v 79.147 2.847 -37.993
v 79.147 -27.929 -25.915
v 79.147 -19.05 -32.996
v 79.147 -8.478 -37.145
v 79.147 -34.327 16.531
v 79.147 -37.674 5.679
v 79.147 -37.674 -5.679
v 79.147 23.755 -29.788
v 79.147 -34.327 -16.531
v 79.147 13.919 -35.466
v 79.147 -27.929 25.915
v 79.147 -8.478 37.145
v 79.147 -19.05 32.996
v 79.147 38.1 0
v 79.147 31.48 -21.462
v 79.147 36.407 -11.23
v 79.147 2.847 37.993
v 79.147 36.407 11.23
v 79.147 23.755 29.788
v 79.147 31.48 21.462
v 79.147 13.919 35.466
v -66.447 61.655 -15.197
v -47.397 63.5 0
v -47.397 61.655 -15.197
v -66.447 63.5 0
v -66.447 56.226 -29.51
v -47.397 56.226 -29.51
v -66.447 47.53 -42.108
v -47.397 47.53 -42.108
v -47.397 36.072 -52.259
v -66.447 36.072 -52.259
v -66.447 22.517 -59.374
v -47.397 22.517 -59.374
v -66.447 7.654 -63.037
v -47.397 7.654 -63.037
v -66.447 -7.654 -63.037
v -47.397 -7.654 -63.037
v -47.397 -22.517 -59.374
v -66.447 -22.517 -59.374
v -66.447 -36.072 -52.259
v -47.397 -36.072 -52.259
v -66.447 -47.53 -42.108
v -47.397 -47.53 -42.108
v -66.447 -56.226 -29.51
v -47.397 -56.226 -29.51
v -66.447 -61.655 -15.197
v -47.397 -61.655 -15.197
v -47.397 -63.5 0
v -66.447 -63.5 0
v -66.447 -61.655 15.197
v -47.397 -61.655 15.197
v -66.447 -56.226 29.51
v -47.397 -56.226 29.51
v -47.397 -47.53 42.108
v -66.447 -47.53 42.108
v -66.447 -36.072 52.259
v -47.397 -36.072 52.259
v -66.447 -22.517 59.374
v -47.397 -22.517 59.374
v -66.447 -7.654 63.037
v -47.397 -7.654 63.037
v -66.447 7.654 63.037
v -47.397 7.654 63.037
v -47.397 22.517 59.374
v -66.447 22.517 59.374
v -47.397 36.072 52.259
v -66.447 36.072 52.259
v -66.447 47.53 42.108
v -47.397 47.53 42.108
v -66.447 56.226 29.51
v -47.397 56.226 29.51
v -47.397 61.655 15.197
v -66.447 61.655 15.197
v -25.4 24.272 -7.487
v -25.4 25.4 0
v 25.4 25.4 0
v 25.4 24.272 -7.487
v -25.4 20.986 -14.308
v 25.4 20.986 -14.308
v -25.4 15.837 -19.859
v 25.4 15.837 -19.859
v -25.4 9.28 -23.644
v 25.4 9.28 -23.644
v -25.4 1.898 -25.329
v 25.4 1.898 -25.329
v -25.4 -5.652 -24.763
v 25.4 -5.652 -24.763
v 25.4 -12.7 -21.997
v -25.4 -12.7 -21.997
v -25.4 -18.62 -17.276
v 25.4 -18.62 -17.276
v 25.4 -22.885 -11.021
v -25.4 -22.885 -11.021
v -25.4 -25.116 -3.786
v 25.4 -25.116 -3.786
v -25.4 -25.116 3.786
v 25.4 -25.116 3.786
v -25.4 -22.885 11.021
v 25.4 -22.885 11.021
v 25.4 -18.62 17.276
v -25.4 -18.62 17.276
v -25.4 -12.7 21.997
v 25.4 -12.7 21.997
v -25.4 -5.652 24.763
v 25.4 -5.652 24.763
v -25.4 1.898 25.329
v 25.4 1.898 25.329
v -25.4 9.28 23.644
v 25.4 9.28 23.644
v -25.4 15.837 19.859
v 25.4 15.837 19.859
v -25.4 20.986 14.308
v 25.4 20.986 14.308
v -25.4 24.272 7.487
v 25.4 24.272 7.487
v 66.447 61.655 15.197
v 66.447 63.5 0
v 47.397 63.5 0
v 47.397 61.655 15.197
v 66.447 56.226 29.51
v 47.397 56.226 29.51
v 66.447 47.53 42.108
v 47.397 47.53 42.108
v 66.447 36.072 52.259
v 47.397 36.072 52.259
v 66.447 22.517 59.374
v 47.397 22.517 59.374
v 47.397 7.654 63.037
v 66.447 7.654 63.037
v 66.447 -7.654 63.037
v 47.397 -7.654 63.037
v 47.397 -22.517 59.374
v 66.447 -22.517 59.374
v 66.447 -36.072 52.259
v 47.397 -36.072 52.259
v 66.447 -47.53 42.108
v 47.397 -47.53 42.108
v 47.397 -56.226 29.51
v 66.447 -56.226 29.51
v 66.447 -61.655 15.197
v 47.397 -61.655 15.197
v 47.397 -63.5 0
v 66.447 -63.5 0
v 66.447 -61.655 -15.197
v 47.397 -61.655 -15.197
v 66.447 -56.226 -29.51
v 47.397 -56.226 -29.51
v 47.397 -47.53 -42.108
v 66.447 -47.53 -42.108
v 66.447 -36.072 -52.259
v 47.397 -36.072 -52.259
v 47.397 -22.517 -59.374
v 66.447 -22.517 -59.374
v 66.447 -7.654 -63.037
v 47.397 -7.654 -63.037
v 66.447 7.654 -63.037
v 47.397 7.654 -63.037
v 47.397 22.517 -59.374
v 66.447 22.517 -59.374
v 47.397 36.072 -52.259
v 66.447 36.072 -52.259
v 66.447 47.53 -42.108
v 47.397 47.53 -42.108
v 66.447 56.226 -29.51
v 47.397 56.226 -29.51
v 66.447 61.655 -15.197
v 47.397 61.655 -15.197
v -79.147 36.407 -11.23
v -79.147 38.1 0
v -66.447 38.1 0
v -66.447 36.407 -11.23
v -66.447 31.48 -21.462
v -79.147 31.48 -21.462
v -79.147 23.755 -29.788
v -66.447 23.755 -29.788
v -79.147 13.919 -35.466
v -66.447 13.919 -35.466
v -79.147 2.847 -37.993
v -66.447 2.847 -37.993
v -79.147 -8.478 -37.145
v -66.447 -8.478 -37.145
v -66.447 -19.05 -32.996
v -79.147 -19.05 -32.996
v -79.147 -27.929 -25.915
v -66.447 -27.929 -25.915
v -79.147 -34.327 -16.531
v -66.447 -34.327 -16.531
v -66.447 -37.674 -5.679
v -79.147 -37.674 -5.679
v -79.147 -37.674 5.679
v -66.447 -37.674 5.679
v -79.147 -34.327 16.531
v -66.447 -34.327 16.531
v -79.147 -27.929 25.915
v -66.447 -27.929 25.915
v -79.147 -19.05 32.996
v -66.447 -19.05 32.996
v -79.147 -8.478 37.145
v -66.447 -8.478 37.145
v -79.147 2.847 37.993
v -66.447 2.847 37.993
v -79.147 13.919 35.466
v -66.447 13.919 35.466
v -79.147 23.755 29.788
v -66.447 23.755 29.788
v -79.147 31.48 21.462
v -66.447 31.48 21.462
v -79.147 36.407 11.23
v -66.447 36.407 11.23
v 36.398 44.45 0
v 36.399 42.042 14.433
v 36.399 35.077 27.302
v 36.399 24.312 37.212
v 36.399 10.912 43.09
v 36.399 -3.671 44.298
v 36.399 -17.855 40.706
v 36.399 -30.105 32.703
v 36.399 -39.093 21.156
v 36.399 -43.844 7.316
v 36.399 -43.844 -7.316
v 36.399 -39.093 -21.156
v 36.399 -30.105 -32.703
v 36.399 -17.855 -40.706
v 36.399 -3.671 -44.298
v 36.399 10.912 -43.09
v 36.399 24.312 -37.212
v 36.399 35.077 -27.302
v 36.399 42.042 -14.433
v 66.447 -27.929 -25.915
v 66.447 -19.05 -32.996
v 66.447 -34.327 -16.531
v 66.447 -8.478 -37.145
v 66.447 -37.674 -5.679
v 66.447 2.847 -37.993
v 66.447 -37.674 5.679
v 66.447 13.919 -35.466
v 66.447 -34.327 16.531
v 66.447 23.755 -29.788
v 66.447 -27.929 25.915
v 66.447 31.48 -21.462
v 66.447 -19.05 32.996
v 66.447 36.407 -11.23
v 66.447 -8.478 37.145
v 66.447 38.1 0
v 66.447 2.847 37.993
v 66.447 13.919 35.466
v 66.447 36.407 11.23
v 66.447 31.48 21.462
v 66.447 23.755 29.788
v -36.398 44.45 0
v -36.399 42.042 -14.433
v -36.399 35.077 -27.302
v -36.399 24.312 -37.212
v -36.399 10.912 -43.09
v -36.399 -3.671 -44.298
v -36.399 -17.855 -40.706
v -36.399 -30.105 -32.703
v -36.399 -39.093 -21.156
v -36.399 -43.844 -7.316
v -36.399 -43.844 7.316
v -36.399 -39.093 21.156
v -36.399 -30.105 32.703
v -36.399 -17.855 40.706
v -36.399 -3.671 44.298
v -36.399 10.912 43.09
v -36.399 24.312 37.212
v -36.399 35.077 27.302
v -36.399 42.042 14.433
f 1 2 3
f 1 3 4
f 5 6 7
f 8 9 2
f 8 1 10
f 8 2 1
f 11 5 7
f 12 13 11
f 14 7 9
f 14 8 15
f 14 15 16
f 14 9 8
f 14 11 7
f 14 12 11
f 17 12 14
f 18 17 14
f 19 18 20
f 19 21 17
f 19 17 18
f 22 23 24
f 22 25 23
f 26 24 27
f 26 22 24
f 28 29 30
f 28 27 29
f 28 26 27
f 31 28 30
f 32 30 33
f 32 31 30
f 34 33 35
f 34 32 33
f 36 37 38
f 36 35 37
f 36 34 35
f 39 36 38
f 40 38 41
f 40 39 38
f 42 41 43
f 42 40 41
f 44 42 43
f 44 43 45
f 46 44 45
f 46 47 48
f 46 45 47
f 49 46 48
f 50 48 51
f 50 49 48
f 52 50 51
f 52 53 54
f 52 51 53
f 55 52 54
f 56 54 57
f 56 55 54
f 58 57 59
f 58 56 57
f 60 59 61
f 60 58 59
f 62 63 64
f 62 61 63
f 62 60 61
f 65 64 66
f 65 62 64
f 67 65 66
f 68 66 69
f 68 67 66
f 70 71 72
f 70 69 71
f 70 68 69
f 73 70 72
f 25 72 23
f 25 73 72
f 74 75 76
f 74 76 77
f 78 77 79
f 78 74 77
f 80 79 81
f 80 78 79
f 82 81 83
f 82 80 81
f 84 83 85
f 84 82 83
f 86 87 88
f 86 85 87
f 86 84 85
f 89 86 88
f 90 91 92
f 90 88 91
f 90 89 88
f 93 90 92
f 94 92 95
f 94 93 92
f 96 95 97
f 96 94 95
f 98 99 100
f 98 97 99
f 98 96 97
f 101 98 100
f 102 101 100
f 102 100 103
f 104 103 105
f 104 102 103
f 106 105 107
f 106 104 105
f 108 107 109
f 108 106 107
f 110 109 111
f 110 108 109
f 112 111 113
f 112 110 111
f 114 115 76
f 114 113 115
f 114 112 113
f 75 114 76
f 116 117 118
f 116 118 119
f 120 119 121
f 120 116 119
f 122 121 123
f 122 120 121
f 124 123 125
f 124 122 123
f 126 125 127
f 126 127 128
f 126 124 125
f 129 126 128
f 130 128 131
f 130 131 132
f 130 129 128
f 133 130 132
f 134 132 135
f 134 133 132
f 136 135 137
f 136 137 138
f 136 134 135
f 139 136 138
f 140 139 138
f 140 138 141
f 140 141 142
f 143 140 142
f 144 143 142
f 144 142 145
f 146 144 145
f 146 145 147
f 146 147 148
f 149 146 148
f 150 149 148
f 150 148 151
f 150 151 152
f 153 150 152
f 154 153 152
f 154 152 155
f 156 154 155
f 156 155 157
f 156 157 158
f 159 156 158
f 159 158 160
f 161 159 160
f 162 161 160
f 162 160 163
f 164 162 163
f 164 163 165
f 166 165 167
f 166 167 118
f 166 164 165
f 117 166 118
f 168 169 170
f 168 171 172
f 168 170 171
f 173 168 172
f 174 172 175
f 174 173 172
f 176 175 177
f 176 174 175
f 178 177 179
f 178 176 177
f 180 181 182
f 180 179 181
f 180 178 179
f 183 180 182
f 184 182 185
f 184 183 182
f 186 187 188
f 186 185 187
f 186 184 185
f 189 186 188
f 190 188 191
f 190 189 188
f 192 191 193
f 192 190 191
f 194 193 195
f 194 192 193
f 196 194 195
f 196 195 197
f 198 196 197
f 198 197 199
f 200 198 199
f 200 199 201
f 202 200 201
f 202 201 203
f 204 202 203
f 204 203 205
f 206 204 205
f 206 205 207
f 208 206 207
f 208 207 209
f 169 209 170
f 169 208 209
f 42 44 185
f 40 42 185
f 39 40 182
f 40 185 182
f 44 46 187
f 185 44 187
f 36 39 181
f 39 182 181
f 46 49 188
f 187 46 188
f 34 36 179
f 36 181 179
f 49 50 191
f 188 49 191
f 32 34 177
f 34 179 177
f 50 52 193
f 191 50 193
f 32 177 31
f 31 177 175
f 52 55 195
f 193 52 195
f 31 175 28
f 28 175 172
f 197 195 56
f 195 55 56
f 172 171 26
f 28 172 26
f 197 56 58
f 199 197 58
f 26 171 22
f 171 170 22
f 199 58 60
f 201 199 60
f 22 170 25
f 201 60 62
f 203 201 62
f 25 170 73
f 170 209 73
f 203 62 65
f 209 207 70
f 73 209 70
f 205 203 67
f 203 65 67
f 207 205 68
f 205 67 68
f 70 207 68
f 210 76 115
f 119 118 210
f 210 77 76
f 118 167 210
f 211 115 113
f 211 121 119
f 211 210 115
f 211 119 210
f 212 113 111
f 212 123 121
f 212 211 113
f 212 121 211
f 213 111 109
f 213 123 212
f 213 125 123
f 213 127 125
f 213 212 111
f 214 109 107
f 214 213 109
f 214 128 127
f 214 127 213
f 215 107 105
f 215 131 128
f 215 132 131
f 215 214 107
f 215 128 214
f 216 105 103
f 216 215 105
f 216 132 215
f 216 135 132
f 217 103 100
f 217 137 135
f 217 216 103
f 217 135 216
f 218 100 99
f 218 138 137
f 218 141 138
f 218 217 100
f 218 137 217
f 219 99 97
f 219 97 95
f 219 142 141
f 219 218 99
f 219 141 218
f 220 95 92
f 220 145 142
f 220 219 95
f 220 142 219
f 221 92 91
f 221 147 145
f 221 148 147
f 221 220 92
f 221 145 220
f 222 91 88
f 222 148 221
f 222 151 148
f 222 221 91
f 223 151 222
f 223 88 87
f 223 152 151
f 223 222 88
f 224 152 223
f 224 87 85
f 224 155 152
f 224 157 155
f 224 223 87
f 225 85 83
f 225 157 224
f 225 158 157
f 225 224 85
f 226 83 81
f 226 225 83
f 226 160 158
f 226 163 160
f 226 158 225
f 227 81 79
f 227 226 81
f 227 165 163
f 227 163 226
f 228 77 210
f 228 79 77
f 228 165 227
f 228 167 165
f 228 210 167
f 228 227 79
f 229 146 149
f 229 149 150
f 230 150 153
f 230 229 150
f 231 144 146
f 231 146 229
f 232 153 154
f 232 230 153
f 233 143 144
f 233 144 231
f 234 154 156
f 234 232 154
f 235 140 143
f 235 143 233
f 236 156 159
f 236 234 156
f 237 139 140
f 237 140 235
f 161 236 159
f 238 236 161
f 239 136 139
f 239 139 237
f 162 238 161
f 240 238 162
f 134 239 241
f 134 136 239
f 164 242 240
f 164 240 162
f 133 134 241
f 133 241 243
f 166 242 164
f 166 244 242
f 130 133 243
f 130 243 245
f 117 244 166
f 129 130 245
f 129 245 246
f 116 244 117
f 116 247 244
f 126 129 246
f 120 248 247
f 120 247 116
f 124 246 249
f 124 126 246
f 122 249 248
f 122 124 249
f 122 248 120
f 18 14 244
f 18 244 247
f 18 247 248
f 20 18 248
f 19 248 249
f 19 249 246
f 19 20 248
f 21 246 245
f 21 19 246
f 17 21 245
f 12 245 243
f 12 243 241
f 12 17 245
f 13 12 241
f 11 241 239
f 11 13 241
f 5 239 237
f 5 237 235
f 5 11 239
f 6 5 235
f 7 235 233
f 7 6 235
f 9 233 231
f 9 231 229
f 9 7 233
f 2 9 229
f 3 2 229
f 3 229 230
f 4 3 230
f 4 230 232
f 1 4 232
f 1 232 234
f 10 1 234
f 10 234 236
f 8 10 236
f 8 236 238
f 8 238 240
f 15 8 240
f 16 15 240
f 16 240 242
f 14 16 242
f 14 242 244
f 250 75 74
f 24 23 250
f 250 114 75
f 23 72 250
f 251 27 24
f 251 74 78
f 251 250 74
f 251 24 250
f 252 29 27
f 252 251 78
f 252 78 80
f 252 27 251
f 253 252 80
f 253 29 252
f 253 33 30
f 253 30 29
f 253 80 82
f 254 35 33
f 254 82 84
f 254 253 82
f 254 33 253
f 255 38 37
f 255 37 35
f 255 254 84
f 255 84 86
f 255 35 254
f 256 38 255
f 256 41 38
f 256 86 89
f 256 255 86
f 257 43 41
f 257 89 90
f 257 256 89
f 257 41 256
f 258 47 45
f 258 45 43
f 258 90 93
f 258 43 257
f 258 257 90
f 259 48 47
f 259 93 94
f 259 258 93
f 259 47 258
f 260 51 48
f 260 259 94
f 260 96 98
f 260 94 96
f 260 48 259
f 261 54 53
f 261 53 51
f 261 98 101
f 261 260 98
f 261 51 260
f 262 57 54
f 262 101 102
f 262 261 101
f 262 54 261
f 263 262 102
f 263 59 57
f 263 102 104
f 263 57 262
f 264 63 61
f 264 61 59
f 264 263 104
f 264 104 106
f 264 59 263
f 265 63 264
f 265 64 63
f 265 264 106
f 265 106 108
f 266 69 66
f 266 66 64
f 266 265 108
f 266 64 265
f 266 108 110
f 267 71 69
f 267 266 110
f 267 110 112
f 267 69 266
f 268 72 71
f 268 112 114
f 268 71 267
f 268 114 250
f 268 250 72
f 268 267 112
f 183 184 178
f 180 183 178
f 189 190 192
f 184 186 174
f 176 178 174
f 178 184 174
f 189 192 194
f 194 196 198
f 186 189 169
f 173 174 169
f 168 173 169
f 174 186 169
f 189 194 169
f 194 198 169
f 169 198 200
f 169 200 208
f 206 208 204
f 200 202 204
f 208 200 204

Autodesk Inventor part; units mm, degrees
ref_plane "YZ Plane" through (0, 0, 0) normal (1, 0, 0) x (0, 1, 0)
ref_plane "XZ Plane" through (0, 0, 0) normal (0, 1, 0) x (-1, 0, 0)
ref_plane "XY Plane" through (0, 0, 0) normal (0, 0, 1) x (1, 0, 0)
sketch "Sketch1" plane through (0, 0, 0) normal (0, 0, 1) x (1, 0, 0)
  line L0 (0, 25.4) -> (-25.4, 25.4)
  line L1 (-25.4, 25.4) -> (-47.397, 63.5)
  line L2 (-47.397, 63.5) -> (-66.447, 63.5)
  line L3 (-66.447, 63.5) -> (-66.447, 38.1)
  line L4 (-66.447, 38.1) -> (-79.147, 38.1)
  line L5 (0, -12.7) -> (0, 76.2) projected
  line L6 (-110.8059, 0) -> (110.8059, 0) projected
  line L7 (0, 25.4) -> (25.4, 25.4)
  line L8 (25.4, 25.4) -> (47.397, 63.5)
  line L9 (47.397, 63.5) -> (66.447, 63.5)
  line L10 (66.447, 63.5) -> (66.447, 38.1)
  line L11 (66.447, 38.1) -> (79.147, 38.1)
  line L12 (79.147, 38.1) -> (79.147, 0)
  line L13 (-79.147, 38.1) -> (-79.147, 0)
  line L14 (-79.147, 0) -> (79.147, 0)
  point P0 (0, 0)
  dimension "d3" = 19.05
  dimension "d13" = 60
  dimension "d14" = 12.7
  dimension "d15" = 127
  dimension "d16" = 76.2
  dimension "d17" = 50.8
  dimension "d18" = 50.8
revolve "Revolution1" add sketch "Sketch1" angle 360 about axis through (-79.147, 0, 0) along (1, 0, 0)
properties part number "Ch3 Part 3"
